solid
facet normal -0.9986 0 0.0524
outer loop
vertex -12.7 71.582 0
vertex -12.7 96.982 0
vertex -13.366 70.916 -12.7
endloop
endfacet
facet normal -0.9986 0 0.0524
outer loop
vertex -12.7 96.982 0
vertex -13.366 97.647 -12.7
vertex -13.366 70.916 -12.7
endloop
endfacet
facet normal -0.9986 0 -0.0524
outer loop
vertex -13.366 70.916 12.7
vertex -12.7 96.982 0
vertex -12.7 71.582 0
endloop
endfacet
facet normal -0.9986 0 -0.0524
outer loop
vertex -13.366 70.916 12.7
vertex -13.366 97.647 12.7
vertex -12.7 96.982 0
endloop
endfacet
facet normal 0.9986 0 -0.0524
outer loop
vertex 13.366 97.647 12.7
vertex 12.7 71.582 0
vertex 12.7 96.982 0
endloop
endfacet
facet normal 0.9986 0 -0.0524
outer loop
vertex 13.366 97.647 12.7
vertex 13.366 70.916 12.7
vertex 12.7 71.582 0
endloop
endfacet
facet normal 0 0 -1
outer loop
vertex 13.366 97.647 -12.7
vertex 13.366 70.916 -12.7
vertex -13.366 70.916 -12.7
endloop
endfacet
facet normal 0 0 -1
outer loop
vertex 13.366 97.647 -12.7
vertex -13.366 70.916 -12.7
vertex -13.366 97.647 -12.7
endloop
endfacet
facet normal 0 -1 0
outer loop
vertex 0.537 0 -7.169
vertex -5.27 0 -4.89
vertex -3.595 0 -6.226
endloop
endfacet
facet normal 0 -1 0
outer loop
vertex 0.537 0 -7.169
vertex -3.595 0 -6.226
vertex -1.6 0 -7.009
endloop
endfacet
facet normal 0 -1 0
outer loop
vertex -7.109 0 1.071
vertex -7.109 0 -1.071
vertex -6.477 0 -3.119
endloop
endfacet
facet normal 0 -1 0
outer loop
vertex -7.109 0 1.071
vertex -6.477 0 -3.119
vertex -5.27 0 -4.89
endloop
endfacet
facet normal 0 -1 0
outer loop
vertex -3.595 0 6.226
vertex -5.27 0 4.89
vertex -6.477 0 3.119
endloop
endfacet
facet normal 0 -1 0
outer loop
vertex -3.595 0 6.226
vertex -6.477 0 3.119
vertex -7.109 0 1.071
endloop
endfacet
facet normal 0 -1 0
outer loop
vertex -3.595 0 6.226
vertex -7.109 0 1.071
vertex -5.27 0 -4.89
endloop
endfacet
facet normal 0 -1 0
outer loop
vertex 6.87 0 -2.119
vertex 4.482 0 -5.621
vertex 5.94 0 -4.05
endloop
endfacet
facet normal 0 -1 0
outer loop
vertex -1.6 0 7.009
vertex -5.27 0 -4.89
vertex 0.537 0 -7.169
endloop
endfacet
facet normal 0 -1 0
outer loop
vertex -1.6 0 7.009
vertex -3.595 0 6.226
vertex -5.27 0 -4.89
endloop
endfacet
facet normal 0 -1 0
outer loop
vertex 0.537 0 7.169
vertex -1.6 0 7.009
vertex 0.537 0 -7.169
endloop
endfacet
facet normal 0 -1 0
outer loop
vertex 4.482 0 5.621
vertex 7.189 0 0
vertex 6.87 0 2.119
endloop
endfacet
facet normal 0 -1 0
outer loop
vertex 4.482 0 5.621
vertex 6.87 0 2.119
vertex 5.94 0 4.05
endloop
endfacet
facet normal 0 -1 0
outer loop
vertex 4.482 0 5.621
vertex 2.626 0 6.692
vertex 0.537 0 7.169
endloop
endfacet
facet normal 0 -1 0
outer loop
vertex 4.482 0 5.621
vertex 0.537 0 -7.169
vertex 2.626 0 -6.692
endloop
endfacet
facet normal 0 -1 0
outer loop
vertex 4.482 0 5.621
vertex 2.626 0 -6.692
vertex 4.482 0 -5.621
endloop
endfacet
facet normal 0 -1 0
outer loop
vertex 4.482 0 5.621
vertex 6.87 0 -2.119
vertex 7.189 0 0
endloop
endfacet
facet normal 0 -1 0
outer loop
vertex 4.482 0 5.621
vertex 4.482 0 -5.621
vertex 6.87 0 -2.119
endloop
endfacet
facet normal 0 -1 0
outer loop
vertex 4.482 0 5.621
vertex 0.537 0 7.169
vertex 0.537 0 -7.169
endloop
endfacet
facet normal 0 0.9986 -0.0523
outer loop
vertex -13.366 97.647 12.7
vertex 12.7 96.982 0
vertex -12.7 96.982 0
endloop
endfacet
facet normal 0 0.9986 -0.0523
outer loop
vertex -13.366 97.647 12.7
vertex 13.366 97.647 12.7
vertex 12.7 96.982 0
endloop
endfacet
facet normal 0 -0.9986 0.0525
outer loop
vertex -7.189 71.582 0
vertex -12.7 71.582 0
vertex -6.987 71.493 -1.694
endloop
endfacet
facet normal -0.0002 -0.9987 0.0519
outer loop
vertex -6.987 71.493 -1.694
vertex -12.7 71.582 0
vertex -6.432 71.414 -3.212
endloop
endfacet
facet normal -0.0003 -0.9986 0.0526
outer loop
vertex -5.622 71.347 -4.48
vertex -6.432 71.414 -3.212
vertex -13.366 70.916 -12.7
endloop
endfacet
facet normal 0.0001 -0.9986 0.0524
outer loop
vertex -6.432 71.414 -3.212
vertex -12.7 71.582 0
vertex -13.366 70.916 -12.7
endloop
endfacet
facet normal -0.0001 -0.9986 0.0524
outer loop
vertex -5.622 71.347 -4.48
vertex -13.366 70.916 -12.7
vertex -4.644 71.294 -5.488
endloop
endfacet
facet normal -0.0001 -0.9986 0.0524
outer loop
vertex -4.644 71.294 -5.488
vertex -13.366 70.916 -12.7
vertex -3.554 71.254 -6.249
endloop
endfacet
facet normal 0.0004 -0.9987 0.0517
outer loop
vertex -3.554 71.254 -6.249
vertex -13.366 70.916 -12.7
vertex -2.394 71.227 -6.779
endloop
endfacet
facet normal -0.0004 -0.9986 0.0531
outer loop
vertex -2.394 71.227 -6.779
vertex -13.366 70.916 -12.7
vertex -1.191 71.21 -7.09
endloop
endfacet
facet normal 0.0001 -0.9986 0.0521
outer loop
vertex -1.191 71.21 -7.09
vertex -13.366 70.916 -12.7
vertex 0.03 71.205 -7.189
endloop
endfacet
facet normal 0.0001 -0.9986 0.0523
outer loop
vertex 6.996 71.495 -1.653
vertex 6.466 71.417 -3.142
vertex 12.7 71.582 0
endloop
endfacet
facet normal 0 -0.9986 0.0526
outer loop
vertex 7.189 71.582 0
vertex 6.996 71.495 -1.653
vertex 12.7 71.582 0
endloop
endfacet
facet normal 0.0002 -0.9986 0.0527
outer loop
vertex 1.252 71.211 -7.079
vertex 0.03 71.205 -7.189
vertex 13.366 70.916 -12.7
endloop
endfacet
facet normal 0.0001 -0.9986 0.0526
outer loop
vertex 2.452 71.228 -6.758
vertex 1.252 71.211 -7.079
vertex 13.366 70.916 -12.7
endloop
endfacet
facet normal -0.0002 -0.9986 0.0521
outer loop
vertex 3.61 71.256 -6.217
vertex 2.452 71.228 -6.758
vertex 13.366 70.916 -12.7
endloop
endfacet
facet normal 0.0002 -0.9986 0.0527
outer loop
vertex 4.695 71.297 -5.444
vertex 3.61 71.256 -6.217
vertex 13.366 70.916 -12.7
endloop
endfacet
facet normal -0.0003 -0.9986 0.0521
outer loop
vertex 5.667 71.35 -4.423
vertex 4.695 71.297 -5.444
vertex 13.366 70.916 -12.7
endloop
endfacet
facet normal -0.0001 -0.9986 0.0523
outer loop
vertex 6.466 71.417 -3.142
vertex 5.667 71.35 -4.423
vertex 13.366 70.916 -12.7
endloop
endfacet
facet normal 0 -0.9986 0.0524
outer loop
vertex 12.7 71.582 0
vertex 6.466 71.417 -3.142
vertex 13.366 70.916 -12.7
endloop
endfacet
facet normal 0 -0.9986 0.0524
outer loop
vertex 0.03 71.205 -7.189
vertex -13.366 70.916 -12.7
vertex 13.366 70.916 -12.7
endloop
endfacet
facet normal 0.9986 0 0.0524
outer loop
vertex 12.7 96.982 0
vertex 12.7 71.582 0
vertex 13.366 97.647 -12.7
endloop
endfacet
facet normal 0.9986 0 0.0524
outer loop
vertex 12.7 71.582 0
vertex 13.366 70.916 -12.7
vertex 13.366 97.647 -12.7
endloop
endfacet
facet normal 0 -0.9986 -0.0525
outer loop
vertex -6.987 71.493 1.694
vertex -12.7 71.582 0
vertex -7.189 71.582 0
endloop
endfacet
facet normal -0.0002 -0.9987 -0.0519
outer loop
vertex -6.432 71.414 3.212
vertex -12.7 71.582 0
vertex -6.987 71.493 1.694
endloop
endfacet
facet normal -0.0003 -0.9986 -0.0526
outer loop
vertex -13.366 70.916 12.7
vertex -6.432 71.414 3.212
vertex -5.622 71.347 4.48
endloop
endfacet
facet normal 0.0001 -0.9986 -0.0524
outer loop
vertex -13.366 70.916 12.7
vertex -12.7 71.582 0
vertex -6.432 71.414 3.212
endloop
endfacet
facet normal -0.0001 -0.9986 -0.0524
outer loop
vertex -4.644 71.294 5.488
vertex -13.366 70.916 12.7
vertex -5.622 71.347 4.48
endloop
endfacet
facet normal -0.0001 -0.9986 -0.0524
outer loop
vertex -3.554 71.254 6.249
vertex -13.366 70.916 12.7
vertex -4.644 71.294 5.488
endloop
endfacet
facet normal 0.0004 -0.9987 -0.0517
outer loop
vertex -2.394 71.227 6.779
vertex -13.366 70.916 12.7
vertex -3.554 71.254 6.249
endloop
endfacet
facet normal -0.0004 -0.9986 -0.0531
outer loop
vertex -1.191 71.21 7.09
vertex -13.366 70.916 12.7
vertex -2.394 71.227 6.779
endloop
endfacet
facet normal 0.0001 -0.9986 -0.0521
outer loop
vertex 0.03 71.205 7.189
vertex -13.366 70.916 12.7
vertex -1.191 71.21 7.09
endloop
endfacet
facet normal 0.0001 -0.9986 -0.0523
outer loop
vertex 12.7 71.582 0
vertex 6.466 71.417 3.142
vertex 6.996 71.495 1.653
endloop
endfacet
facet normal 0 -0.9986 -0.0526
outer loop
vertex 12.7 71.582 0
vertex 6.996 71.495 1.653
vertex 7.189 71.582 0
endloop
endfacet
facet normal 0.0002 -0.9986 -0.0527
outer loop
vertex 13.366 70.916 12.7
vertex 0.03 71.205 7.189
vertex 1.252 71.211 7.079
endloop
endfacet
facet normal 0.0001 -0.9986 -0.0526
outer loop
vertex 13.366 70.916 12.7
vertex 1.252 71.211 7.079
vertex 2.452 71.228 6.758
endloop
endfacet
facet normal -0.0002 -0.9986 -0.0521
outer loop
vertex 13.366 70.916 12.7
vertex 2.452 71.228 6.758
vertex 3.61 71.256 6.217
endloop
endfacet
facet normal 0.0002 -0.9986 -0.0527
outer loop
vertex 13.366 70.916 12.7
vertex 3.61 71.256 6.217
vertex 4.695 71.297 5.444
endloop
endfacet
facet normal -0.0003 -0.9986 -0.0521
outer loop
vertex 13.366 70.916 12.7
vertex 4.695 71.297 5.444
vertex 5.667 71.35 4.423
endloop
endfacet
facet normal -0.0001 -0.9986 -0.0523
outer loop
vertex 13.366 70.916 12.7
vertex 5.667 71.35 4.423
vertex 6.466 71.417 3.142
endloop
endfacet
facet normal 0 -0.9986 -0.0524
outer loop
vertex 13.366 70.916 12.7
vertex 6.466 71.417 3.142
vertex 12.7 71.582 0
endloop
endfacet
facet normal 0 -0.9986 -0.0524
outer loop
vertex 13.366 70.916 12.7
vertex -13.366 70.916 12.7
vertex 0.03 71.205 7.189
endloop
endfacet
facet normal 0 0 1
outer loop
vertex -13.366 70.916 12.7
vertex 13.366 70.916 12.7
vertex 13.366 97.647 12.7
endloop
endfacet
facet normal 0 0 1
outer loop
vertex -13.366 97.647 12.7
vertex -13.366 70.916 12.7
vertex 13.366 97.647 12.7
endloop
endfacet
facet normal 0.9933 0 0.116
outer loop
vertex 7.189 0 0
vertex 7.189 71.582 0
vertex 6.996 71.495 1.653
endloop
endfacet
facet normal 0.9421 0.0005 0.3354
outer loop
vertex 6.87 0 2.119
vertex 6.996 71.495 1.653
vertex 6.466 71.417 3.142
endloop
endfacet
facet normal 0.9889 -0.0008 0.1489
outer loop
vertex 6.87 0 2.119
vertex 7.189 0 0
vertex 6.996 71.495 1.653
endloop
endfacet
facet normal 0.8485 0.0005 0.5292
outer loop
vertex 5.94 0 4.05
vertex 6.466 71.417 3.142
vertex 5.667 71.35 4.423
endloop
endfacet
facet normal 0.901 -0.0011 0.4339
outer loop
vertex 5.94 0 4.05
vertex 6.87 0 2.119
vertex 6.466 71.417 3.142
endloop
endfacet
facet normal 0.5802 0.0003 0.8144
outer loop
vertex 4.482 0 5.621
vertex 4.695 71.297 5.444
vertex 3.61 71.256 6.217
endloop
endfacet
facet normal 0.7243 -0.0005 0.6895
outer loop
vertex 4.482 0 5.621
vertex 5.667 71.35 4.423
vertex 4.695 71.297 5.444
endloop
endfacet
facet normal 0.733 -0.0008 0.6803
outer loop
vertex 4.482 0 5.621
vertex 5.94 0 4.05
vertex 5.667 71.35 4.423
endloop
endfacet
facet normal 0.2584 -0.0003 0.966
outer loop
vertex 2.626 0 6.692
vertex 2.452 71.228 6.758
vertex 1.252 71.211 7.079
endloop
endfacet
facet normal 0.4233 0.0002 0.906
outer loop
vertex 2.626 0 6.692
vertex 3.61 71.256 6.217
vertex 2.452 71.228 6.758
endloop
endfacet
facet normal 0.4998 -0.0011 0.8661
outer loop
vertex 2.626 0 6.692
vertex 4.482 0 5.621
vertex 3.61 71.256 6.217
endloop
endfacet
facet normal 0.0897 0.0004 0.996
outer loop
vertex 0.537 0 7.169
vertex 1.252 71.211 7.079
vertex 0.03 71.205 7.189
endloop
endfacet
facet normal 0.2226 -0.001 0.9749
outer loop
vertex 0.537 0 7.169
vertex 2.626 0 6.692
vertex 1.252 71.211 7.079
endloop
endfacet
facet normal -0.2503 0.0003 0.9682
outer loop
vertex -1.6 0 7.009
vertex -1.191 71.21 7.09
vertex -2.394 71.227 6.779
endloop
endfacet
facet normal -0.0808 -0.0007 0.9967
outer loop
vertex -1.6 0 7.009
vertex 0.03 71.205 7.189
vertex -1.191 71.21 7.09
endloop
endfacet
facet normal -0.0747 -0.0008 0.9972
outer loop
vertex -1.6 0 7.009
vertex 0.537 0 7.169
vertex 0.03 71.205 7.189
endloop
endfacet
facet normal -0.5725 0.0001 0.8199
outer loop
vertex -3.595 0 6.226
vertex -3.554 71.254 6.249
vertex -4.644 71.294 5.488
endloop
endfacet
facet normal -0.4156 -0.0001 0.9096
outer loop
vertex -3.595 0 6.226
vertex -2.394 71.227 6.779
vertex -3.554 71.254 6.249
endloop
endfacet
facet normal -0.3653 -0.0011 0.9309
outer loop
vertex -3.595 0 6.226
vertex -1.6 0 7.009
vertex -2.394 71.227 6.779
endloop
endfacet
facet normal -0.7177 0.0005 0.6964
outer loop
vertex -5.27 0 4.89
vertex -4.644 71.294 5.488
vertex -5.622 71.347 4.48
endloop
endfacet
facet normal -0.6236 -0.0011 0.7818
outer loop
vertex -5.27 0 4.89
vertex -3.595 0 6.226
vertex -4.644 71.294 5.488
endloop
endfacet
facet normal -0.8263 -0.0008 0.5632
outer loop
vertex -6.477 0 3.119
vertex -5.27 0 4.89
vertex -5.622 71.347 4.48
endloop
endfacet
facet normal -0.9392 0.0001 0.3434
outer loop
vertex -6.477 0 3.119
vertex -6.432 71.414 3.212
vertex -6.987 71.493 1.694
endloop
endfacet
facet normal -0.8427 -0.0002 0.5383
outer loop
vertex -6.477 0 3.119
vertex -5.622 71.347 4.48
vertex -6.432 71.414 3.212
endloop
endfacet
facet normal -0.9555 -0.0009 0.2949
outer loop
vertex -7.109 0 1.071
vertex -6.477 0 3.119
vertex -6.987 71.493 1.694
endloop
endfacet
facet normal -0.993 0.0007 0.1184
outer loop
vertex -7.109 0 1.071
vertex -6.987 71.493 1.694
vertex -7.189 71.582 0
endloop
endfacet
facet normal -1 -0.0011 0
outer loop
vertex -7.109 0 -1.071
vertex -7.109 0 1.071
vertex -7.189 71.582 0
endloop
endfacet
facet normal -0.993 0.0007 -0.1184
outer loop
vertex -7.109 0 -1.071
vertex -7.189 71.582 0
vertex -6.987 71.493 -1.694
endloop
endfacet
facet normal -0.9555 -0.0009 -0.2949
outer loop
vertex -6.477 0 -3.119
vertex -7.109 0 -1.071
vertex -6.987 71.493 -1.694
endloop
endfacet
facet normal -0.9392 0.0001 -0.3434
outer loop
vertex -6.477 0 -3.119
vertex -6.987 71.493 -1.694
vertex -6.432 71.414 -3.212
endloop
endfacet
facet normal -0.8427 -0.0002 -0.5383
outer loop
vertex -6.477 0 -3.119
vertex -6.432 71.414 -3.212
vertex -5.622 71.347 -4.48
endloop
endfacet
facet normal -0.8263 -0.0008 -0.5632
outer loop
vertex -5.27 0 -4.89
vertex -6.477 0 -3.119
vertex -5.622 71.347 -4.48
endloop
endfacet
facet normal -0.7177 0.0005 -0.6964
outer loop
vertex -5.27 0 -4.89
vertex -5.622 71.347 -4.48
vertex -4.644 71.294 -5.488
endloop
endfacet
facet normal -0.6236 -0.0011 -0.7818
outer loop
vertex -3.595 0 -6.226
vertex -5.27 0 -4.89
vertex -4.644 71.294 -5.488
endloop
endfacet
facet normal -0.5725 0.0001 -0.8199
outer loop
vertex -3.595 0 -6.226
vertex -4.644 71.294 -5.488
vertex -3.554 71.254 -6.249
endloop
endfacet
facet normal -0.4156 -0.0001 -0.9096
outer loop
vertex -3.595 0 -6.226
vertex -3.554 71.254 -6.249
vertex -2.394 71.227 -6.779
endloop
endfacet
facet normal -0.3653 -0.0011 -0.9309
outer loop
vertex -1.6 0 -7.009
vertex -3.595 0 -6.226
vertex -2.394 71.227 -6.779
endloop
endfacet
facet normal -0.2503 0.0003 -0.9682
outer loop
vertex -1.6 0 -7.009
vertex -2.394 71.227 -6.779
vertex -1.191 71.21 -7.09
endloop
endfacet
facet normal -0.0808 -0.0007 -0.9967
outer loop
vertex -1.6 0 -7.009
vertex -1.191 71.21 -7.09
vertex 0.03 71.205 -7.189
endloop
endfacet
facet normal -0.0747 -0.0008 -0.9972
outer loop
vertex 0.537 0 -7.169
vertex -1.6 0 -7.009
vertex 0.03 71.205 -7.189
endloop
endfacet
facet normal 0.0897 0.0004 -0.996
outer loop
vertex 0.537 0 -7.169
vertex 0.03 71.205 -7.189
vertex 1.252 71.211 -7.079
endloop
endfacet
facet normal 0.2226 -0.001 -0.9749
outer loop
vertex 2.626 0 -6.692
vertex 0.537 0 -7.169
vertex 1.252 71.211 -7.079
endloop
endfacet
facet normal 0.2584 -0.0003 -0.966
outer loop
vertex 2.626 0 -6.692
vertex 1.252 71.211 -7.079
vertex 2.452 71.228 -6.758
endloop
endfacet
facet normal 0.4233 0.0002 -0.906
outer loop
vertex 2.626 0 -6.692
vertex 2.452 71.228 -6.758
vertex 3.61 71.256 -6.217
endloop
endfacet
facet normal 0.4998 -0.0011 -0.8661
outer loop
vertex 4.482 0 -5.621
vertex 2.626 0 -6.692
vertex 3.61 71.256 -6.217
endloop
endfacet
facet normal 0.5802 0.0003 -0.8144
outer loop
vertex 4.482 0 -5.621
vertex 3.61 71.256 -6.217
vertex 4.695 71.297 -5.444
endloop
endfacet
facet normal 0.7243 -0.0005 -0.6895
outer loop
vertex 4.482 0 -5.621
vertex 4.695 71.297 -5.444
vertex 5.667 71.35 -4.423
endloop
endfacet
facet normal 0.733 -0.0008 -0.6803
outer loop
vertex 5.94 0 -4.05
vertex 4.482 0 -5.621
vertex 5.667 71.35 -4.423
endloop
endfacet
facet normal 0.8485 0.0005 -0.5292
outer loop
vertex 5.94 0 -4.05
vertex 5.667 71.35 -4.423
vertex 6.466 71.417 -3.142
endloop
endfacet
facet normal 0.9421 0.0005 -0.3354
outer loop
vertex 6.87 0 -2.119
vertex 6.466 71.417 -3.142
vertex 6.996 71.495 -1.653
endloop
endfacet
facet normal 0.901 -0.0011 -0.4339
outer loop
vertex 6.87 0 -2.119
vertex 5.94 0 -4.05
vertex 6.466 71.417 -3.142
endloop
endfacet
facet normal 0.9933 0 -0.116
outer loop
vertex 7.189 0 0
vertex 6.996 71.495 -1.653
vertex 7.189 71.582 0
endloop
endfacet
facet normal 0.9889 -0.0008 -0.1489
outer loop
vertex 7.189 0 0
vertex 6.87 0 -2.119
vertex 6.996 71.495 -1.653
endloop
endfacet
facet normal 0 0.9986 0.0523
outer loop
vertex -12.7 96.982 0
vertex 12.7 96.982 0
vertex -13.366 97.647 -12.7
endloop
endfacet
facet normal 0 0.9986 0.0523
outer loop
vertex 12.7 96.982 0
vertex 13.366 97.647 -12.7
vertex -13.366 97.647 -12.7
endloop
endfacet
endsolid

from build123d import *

# Parameters (mm, degrees)
F0_W     = 12.7
F0_H     = 25.4
F1_DEPTH = 12.7
F1_TAPER = -3
F2_R     = 7.189125638


with BuildPart() as f1:
    # F0 (on Top) → F1 (new body, symmetric)
    with BuildSketch(Plane.XY):
        with Locations((6.35, 84.2818446611)):
            Rectangle(F0_W, F0_H)
        with Locations((-6.35, 84.2818446611)):
            Rectangle(F0_W, F0_H)
    extrude(amount=F1_DEPTH, both=True, taper=F1_TAPER)

    # F2 (on Front) → F3 (join, up to the next surface of F1)
    with BuildSketch(Plane.XZ):
        Circle(F2_R)
    extrude(until=Until.NEXT, dir=(0, 1, 0))


solid = f1.part
